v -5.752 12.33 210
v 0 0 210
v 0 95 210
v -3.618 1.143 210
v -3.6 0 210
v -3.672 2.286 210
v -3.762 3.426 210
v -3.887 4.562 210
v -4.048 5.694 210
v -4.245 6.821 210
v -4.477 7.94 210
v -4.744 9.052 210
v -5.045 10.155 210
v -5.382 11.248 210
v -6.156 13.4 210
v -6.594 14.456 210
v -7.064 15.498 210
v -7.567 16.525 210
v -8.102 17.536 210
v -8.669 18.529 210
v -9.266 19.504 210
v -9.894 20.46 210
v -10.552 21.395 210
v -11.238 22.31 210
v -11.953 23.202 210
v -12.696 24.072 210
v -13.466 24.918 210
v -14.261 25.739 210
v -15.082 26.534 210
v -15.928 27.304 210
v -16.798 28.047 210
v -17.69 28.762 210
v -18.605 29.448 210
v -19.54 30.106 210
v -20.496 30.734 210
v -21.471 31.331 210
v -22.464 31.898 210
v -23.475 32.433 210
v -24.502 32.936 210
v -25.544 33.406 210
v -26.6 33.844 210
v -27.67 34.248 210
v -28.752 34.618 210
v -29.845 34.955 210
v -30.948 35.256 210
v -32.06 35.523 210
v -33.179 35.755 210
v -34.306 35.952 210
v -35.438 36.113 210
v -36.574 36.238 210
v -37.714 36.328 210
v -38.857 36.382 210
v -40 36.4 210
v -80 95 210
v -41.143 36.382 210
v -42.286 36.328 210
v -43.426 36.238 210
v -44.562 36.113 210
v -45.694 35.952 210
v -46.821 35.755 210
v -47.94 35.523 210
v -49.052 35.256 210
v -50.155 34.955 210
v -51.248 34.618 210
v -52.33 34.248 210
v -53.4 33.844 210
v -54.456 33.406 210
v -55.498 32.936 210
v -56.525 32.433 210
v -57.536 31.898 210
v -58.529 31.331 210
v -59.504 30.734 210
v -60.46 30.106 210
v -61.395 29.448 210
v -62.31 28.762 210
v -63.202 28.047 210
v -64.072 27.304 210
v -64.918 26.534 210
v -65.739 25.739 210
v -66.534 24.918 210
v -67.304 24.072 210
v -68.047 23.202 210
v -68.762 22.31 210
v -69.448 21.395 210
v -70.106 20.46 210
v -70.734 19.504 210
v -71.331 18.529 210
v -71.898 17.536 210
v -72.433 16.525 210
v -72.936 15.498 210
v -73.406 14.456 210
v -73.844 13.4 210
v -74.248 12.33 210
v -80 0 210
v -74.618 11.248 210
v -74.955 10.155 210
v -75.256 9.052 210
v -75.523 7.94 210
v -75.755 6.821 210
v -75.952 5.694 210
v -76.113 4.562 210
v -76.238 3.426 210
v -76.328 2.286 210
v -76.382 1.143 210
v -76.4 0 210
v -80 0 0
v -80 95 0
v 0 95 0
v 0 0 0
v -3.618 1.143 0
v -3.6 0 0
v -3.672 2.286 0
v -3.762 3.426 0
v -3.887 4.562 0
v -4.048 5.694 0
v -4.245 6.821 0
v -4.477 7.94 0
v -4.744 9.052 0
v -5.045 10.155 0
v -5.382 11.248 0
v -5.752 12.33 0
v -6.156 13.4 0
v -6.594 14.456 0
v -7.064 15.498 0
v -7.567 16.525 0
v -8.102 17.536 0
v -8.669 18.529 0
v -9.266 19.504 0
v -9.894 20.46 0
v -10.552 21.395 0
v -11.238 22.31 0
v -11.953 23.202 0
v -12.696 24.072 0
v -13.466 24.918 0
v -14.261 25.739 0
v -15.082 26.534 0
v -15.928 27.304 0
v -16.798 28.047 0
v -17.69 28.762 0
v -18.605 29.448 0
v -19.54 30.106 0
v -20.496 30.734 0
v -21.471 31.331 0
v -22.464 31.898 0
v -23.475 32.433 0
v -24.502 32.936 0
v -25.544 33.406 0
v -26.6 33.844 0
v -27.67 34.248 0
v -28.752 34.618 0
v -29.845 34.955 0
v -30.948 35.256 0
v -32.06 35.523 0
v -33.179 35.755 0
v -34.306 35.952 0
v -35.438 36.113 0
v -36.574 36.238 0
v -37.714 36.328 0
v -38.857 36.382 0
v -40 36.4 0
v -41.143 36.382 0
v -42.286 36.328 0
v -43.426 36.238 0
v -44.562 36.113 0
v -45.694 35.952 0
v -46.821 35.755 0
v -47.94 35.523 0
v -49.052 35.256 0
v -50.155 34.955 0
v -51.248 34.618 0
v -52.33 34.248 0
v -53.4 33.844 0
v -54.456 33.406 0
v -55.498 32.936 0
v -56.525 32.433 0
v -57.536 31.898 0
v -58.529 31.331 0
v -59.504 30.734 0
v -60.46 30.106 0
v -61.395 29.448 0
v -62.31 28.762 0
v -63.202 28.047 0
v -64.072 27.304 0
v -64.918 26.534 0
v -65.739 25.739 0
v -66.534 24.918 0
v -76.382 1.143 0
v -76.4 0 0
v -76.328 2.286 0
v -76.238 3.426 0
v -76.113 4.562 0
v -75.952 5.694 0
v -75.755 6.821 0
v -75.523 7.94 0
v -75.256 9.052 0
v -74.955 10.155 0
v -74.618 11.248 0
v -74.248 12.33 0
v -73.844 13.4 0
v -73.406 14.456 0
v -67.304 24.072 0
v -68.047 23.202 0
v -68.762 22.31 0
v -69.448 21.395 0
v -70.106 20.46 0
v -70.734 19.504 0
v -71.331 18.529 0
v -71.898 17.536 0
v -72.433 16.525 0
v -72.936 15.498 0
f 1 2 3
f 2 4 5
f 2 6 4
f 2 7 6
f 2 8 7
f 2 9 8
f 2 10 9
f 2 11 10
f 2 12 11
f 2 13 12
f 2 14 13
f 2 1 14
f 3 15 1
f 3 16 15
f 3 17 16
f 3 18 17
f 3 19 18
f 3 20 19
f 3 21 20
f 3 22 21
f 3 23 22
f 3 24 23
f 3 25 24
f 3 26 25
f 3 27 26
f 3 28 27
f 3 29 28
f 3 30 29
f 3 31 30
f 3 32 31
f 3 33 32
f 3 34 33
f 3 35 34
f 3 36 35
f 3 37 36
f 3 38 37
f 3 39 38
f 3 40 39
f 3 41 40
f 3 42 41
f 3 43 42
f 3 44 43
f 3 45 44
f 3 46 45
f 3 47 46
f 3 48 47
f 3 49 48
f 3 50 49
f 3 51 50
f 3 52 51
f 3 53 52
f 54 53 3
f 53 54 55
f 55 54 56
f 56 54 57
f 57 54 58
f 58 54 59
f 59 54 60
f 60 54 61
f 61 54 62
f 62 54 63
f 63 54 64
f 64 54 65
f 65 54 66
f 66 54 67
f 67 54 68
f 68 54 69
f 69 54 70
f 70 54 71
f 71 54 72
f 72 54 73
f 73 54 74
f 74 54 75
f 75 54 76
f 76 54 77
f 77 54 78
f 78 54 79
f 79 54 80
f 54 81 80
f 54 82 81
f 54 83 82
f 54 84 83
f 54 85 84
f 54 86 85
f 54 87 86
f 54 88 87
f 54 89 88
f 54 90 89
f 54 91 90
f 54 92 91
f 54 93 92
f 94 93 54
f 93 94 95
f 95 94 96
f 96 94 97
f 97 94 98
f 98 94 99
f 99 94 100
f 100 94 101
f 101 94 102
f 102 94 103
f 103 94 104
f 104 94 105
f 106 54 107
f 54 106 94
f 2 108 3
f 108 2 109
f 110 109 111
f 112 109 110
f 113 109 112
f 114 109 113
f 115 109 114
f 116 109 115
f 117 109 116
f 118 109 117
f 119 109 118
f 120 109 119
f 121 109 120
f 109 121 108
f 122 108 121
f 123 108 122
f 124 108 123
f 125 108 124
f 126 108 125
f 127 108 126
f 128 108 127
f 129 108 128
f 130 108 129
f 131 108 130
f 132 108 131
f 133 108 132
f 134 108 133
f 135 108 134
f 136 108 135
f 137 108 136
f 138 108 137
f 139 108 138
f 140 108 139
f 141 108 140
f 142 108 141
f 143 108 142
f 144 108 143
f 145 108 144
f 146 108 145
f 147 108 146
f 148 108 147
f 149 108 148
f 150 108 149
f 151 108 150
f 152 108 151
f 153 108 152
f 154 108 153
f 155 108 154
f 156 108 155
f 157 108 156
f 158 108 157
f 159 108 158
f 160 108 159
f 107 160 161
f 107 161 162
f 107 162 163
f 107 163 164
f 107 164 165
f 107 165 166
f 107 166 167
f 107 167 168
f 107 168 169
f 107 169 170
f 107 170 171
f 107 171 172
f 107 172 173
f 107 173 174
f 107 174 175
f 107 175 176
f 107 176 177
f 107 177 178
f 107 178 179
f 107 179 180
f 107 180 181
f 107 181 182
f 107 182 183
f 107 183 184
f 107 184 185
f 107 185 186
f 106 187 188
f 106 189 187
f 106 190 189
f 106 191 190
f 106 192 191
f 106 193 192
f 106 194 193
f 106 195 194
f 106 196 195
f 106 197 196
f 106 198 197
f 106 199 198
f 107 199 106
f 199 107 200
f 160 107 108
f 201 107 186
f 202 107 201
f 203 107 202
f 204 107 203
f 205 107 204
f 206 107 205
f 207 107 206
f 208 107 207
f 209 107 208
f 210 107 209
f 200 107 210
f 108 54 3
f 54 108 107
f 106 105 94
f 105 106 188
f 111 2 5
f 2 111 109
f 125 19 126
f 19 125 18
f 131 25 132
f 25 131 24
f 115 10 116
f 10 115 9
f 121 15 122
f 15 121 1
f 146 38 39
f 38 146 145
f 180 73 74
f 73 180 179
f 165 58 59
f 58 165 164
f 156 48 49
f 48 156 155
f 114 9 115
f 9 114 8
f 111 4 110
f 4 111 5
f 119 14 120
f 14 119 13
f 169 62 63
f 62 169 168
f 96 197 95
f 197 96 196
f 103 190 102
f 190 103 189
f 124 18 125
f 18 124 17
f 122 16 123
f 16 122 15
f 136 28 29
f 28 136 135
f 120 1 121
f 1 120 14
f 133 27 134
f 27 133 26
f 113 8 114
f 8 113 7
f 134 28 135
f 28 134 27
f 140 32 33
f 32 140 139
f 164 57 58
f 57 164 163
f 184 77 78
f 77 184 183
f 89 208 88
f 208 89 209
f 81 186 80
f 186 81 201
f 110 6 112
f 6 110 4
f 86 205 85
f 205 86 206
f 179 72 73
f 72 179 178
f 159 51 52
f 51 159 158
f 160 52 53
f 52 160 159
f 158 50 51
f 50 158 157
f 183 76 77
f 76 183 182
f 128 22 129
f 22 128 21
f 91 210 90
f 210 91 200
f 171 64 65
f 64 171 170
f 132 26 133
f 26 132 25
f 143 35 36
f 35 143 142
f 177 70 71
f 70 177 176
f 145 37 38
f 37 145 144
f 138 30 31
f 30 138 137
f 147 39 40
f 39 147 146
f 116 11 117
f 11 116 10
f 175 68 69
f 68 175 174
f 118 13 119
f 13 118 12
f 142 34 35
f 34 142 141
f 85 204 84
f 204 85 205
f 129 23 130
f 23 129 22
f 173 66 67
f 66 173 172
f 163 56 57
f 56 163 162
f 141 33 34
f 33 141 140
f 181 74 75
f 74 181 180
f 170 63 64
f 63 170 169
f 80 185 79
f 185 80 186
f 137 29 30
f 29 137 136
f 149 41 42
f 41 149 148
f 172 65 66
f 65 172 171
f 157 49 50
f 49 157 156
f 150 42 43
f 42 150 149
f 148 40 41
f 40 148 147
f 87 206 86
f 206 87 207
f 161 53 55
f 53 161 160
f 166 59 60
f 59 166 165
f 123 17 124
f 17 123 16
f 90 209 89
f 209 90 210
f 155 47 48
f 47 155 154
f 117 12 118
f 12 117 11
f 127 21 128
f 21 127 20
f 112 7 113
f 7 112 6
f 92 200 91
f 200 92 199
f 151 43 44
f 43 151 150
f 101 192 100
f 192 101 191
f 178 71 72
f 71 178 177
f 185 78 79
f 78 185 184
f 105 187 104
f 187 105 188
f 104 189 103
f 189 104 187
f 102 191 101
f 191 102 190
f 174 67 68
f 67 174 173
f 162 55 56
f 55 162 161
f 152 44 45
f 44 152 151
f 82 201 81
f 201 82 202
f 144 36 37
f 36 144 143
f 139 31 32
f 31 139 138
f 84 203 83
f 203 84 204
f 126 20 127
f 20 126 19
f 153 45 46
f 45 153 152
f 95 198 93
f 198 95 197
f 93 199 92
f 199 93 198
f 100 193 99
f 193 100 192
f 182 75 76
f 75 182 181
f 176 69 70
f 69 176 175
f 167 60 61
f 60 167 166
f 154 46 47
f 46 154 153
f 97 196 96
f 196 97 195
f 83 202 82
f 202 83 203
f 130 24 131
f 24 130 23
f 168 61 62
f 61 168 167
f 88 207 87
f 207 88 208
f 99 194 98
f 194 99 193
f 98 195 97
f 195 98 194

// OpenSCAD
height=80;
width=210;
depth=height/2+95;

x=210;
y=95;
z=80;

wall=1.8;
pad=0.1;
$fn=200;

module old() {
    module body() {
        cylinder(d=height,h=width);
        translate([0,-height/2,])
        cube([depth-height/2,height,width]);
    }

    difference() {
        body();
        hull() { 
            translate([0,0,-pad])
            cylinder(d=height-wall*2,h=width+pad*2);
            translate([depth,0,-pad])
            cylinder(d=height-wall*2,h=width+pad*2);
        }
    }
}

rotate([0,-90,0])
difference() {
    cube([x,y,z]);
    translate([-pad,0,z/2])
    rotate([0,90,0])
    cylinder(d=z-wall*4,h=x+pad*2);
}
